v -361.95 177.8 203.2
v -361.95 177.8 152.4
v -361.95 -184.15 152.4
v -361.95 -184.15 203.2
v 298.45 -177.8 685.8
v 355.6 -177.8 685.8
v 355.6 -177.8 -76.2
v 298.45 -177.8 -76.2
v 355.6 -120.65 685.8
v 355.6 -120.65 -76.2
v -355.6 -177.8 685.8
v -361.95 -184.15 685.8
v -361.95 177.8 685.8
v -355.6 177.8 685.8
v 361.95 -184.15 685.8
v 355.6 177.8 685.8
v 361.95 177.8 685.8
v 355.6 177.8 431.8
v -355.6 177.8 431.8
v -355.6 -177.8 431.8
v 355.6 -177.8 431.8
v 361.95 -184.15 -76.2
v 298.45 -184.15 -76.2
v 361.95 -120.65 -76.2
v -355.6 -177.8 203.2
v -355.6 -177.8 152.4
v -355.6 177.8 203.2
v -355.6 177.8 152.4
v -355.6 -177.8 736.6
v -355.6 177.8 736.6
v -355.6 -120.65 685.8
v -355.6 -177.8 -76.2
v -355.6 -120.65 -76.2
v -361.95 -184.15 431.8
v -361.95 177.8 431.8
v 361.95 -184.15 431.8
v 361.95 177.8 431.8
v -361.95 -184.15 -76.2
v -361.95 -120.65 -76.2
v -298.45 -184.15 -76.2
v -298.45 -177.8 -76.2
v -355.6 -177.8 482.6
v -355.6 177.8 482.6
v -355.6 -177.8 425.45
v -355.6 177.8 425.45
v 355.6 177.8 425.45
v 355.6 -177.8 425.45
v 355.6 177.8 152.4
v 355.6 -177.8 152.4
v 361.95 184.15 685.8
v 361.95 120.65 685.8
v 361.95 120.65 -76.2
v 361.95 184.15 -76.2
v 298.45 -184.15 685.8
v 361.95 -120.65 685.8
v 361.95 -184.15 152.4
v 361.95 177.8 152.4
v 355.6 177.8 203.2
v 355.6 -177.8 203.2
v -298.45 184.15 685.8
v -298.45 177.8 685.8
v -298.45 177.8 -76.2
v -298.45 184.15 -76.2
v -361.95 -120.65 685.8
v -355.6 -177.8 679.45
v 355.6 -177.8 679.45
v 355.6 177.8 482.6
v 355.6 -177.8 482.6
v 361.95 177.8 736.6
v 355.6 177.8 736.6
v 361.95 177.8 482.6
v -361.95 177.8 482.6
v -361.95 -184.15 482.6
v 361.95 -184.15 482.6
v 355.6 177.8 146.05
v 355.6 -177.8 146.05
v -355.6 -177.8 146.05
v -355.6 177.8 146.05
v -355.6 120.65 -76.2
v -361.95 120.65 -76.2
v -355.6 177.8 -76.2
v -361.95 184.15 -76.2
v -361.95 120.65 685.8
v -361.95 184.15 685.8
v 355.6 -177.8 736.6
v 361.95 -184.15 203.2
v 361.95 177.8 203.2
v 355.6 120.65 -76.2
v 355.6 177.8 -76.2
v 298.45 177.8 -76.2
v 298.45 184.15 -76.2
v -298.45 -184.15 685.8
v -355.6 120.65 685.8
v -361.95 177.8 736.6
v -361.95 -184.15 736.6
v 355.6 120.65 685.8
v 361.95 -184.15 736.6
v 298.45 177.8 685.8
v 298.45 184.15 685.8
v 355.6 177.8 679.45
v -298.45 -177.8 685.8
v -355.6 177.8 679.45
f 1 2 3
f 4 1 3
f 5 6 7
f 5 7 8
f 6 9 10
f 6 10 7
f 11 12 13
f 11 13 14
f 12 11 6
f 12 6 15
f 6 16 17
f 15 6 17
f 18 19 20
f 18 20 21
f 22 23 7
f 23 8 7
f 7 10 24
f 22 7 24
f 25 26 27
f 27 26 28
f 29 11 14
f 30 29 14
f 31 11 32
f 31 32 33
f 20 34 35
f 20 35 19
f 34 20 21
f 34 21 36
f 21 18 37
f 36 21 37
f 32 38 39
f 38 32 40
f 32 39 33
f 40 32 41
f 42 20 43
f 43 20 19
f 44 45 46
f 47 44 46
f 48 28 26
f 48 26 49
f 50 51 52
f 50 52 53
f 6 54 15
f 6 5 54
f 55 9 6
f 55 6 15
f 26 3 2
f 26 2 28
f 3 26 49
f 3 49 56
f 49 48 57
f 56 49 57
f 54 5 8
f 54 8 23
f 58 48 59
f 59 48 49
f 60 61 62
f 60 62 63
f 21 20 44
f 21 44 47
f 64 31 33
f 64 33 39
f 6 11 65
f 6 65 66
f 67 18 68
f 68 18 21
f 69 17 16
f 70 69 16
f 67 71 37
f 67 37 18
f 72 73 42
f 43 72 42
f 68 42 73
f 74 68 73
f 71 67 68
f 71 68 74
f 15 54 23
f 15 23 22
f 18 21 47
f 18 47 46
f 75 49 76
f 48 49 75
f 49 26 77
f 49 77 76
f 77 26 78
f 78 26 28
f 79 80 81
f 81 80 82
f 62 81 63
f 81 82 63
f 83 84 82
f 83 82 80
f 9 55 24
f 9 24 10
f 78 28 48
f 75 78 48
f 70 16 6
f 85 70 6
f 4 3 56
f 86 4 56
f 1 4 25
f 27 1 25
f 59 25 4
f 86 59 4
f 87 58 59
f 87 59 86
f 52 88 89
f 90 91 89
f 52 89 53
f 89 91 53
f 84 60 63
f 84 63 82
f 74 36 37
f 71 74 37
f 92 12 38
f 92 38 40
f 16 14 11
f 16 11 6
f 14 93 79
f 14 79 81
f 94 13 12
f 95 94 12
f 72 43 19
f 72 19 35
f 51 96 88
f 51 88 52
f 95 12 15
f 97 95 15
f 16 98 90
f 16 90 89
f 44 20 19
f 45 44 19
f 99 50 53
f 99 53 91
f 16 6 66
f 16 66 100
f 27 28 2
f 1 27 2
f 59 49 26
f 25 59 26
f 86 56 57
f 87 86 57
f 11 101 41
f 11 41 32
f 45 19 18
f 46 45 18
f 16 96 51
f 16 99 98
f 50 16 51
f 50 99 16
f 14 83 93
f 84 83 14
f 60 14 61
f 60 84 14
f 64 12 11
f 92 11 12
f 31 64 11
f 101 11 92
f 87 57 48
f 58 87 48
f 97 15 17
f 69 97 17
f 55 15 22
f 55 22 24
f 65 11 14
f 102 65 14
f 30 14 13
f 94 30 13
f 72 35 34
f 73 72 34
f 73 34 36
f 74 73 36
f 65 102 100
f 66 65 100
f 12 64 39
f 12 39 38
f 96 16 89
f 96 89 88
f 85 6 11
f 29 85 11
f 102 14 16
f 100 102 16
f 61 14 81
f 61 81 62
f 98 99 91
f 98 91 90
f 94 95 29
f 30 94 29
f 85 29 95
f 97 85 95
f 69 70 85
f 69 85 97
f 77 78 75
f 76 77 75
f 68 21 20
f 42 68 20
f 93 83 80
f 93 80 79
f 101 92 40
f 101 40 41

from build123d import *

# Parameters (mm, degrees)
F4_DEPTH  = 762
F5_W      = 711.2
F5_H      = 355.6
F6_DEPTH  = 6.35
F7_W      = 711.2
F7_H      = 355.6
F8_DEPTH  = 6.35
F9_W      = 711.2
F9_H      = 355.6
F10_DEPTH = 6.35
F12_DEPTH = 50.8
F14_DEPTH = 50.8
F16_DEPTH = 50.8


with BuildPart() as f4:
    # F3 (on offset) → F4 (new body)
    with BuildSketch(Plane.XY.offset(685.8)):
        Polygon((-361.95, 120.65), (-355.6, 120.65), (-355.6, 177.8), (-298.45, 177.8), (-298.45, 184.15), (-361.95, 184.15), align=None)
        Polygon((-298.45, -177.8), (-355.6, -177.8), (-355.6, -120.65), (-361.95, -120.65), (-361.95, -184.15), (-298.45, -184.15), align=None)
        Polygon((298.45, -184.15), (361.95, -184.15), (361.95, -120.65), (355.6, -120.65), (355.6, -177.8), (298.45, -177.8), align=None)
        Polygon((355.6, 177.8), (355.6, 120.65), (361.95, 120.65), (361.95, 184.15), (298.45, 184.15), (298.45, 177.8), align=None)
    extrude(amount=-F4_DEPTH)


with BuildPart() as f6:
    # F5 (on offset) → F6 (new body)
    with BuildSketch(Plane.XY.offset(152.4)):
        Rectangle(F5_W, F5_H)
    extrude(amount=-F6_DEPTH)


with BuildPart() as f8:
    # F7 (on offset) → F8 (new body)
    with BuildSketch(Plane.XY.offset(431.8)):
        Rectangle(F7_W, F7_H)
    extrude(amount=-F8_DEPTH)


with BuildPart() as f10:
    # F9 (on offset) → F10 (new body)
    with BuildSketch(Plane.XY.offset(685.8)):
        Rectangle(F9_W, F9_H)
    extrude(amount=-F10_DEPTH)


with BuildPart() as f12:
    # F11 (on offset) → F12 (new body)
    with BuildSketch(Plane.XY.offset(685.8)):
        Polygon((-355.6, -177.8), (-355.6, 177.8), (-361.95, 177.8), (-361.95, -184.15), (361.95, -184.15), (361.95, 177.8), (355.6, 177.8), (355.6, -177.8), align=None)
    extrude(amount=F12_DEPTH)


with BuildPart() as f14:
    # F13 (on offset) → F14 (new body)
    with BuildSketch(Plane.XY.offset(431.8)):
        Polygon((-355.6, -177.8), (-355.6, 177.8), (-361.95, 177.8), (-361.95, -184.15), (361.95, -184.15), (361.95, 177.8), (355.6, 177.8), (355.6, -177.8), align=None)
    extrude(amount=F14_DEPTH)


with BuildPart() as f16:
    # F15 (on offset) → F16 (new body)
    with BuildSketch(Plane.XY.offset(152.4)):
        Polygon((-355.6, -177.8), (-355.6, 177.8), (-361.95, 177.8), (-361.95, -184.15), (361.95, -184.15), (361.95, 177.8), (355.6, 177.8), (355.6, -177.8), align=None)
    extrude(amount=F16_DEPTH)


solid = Compound([f4.part, f6.part, f8.part, f10.part, f12.part, f14.part, f16.part])
